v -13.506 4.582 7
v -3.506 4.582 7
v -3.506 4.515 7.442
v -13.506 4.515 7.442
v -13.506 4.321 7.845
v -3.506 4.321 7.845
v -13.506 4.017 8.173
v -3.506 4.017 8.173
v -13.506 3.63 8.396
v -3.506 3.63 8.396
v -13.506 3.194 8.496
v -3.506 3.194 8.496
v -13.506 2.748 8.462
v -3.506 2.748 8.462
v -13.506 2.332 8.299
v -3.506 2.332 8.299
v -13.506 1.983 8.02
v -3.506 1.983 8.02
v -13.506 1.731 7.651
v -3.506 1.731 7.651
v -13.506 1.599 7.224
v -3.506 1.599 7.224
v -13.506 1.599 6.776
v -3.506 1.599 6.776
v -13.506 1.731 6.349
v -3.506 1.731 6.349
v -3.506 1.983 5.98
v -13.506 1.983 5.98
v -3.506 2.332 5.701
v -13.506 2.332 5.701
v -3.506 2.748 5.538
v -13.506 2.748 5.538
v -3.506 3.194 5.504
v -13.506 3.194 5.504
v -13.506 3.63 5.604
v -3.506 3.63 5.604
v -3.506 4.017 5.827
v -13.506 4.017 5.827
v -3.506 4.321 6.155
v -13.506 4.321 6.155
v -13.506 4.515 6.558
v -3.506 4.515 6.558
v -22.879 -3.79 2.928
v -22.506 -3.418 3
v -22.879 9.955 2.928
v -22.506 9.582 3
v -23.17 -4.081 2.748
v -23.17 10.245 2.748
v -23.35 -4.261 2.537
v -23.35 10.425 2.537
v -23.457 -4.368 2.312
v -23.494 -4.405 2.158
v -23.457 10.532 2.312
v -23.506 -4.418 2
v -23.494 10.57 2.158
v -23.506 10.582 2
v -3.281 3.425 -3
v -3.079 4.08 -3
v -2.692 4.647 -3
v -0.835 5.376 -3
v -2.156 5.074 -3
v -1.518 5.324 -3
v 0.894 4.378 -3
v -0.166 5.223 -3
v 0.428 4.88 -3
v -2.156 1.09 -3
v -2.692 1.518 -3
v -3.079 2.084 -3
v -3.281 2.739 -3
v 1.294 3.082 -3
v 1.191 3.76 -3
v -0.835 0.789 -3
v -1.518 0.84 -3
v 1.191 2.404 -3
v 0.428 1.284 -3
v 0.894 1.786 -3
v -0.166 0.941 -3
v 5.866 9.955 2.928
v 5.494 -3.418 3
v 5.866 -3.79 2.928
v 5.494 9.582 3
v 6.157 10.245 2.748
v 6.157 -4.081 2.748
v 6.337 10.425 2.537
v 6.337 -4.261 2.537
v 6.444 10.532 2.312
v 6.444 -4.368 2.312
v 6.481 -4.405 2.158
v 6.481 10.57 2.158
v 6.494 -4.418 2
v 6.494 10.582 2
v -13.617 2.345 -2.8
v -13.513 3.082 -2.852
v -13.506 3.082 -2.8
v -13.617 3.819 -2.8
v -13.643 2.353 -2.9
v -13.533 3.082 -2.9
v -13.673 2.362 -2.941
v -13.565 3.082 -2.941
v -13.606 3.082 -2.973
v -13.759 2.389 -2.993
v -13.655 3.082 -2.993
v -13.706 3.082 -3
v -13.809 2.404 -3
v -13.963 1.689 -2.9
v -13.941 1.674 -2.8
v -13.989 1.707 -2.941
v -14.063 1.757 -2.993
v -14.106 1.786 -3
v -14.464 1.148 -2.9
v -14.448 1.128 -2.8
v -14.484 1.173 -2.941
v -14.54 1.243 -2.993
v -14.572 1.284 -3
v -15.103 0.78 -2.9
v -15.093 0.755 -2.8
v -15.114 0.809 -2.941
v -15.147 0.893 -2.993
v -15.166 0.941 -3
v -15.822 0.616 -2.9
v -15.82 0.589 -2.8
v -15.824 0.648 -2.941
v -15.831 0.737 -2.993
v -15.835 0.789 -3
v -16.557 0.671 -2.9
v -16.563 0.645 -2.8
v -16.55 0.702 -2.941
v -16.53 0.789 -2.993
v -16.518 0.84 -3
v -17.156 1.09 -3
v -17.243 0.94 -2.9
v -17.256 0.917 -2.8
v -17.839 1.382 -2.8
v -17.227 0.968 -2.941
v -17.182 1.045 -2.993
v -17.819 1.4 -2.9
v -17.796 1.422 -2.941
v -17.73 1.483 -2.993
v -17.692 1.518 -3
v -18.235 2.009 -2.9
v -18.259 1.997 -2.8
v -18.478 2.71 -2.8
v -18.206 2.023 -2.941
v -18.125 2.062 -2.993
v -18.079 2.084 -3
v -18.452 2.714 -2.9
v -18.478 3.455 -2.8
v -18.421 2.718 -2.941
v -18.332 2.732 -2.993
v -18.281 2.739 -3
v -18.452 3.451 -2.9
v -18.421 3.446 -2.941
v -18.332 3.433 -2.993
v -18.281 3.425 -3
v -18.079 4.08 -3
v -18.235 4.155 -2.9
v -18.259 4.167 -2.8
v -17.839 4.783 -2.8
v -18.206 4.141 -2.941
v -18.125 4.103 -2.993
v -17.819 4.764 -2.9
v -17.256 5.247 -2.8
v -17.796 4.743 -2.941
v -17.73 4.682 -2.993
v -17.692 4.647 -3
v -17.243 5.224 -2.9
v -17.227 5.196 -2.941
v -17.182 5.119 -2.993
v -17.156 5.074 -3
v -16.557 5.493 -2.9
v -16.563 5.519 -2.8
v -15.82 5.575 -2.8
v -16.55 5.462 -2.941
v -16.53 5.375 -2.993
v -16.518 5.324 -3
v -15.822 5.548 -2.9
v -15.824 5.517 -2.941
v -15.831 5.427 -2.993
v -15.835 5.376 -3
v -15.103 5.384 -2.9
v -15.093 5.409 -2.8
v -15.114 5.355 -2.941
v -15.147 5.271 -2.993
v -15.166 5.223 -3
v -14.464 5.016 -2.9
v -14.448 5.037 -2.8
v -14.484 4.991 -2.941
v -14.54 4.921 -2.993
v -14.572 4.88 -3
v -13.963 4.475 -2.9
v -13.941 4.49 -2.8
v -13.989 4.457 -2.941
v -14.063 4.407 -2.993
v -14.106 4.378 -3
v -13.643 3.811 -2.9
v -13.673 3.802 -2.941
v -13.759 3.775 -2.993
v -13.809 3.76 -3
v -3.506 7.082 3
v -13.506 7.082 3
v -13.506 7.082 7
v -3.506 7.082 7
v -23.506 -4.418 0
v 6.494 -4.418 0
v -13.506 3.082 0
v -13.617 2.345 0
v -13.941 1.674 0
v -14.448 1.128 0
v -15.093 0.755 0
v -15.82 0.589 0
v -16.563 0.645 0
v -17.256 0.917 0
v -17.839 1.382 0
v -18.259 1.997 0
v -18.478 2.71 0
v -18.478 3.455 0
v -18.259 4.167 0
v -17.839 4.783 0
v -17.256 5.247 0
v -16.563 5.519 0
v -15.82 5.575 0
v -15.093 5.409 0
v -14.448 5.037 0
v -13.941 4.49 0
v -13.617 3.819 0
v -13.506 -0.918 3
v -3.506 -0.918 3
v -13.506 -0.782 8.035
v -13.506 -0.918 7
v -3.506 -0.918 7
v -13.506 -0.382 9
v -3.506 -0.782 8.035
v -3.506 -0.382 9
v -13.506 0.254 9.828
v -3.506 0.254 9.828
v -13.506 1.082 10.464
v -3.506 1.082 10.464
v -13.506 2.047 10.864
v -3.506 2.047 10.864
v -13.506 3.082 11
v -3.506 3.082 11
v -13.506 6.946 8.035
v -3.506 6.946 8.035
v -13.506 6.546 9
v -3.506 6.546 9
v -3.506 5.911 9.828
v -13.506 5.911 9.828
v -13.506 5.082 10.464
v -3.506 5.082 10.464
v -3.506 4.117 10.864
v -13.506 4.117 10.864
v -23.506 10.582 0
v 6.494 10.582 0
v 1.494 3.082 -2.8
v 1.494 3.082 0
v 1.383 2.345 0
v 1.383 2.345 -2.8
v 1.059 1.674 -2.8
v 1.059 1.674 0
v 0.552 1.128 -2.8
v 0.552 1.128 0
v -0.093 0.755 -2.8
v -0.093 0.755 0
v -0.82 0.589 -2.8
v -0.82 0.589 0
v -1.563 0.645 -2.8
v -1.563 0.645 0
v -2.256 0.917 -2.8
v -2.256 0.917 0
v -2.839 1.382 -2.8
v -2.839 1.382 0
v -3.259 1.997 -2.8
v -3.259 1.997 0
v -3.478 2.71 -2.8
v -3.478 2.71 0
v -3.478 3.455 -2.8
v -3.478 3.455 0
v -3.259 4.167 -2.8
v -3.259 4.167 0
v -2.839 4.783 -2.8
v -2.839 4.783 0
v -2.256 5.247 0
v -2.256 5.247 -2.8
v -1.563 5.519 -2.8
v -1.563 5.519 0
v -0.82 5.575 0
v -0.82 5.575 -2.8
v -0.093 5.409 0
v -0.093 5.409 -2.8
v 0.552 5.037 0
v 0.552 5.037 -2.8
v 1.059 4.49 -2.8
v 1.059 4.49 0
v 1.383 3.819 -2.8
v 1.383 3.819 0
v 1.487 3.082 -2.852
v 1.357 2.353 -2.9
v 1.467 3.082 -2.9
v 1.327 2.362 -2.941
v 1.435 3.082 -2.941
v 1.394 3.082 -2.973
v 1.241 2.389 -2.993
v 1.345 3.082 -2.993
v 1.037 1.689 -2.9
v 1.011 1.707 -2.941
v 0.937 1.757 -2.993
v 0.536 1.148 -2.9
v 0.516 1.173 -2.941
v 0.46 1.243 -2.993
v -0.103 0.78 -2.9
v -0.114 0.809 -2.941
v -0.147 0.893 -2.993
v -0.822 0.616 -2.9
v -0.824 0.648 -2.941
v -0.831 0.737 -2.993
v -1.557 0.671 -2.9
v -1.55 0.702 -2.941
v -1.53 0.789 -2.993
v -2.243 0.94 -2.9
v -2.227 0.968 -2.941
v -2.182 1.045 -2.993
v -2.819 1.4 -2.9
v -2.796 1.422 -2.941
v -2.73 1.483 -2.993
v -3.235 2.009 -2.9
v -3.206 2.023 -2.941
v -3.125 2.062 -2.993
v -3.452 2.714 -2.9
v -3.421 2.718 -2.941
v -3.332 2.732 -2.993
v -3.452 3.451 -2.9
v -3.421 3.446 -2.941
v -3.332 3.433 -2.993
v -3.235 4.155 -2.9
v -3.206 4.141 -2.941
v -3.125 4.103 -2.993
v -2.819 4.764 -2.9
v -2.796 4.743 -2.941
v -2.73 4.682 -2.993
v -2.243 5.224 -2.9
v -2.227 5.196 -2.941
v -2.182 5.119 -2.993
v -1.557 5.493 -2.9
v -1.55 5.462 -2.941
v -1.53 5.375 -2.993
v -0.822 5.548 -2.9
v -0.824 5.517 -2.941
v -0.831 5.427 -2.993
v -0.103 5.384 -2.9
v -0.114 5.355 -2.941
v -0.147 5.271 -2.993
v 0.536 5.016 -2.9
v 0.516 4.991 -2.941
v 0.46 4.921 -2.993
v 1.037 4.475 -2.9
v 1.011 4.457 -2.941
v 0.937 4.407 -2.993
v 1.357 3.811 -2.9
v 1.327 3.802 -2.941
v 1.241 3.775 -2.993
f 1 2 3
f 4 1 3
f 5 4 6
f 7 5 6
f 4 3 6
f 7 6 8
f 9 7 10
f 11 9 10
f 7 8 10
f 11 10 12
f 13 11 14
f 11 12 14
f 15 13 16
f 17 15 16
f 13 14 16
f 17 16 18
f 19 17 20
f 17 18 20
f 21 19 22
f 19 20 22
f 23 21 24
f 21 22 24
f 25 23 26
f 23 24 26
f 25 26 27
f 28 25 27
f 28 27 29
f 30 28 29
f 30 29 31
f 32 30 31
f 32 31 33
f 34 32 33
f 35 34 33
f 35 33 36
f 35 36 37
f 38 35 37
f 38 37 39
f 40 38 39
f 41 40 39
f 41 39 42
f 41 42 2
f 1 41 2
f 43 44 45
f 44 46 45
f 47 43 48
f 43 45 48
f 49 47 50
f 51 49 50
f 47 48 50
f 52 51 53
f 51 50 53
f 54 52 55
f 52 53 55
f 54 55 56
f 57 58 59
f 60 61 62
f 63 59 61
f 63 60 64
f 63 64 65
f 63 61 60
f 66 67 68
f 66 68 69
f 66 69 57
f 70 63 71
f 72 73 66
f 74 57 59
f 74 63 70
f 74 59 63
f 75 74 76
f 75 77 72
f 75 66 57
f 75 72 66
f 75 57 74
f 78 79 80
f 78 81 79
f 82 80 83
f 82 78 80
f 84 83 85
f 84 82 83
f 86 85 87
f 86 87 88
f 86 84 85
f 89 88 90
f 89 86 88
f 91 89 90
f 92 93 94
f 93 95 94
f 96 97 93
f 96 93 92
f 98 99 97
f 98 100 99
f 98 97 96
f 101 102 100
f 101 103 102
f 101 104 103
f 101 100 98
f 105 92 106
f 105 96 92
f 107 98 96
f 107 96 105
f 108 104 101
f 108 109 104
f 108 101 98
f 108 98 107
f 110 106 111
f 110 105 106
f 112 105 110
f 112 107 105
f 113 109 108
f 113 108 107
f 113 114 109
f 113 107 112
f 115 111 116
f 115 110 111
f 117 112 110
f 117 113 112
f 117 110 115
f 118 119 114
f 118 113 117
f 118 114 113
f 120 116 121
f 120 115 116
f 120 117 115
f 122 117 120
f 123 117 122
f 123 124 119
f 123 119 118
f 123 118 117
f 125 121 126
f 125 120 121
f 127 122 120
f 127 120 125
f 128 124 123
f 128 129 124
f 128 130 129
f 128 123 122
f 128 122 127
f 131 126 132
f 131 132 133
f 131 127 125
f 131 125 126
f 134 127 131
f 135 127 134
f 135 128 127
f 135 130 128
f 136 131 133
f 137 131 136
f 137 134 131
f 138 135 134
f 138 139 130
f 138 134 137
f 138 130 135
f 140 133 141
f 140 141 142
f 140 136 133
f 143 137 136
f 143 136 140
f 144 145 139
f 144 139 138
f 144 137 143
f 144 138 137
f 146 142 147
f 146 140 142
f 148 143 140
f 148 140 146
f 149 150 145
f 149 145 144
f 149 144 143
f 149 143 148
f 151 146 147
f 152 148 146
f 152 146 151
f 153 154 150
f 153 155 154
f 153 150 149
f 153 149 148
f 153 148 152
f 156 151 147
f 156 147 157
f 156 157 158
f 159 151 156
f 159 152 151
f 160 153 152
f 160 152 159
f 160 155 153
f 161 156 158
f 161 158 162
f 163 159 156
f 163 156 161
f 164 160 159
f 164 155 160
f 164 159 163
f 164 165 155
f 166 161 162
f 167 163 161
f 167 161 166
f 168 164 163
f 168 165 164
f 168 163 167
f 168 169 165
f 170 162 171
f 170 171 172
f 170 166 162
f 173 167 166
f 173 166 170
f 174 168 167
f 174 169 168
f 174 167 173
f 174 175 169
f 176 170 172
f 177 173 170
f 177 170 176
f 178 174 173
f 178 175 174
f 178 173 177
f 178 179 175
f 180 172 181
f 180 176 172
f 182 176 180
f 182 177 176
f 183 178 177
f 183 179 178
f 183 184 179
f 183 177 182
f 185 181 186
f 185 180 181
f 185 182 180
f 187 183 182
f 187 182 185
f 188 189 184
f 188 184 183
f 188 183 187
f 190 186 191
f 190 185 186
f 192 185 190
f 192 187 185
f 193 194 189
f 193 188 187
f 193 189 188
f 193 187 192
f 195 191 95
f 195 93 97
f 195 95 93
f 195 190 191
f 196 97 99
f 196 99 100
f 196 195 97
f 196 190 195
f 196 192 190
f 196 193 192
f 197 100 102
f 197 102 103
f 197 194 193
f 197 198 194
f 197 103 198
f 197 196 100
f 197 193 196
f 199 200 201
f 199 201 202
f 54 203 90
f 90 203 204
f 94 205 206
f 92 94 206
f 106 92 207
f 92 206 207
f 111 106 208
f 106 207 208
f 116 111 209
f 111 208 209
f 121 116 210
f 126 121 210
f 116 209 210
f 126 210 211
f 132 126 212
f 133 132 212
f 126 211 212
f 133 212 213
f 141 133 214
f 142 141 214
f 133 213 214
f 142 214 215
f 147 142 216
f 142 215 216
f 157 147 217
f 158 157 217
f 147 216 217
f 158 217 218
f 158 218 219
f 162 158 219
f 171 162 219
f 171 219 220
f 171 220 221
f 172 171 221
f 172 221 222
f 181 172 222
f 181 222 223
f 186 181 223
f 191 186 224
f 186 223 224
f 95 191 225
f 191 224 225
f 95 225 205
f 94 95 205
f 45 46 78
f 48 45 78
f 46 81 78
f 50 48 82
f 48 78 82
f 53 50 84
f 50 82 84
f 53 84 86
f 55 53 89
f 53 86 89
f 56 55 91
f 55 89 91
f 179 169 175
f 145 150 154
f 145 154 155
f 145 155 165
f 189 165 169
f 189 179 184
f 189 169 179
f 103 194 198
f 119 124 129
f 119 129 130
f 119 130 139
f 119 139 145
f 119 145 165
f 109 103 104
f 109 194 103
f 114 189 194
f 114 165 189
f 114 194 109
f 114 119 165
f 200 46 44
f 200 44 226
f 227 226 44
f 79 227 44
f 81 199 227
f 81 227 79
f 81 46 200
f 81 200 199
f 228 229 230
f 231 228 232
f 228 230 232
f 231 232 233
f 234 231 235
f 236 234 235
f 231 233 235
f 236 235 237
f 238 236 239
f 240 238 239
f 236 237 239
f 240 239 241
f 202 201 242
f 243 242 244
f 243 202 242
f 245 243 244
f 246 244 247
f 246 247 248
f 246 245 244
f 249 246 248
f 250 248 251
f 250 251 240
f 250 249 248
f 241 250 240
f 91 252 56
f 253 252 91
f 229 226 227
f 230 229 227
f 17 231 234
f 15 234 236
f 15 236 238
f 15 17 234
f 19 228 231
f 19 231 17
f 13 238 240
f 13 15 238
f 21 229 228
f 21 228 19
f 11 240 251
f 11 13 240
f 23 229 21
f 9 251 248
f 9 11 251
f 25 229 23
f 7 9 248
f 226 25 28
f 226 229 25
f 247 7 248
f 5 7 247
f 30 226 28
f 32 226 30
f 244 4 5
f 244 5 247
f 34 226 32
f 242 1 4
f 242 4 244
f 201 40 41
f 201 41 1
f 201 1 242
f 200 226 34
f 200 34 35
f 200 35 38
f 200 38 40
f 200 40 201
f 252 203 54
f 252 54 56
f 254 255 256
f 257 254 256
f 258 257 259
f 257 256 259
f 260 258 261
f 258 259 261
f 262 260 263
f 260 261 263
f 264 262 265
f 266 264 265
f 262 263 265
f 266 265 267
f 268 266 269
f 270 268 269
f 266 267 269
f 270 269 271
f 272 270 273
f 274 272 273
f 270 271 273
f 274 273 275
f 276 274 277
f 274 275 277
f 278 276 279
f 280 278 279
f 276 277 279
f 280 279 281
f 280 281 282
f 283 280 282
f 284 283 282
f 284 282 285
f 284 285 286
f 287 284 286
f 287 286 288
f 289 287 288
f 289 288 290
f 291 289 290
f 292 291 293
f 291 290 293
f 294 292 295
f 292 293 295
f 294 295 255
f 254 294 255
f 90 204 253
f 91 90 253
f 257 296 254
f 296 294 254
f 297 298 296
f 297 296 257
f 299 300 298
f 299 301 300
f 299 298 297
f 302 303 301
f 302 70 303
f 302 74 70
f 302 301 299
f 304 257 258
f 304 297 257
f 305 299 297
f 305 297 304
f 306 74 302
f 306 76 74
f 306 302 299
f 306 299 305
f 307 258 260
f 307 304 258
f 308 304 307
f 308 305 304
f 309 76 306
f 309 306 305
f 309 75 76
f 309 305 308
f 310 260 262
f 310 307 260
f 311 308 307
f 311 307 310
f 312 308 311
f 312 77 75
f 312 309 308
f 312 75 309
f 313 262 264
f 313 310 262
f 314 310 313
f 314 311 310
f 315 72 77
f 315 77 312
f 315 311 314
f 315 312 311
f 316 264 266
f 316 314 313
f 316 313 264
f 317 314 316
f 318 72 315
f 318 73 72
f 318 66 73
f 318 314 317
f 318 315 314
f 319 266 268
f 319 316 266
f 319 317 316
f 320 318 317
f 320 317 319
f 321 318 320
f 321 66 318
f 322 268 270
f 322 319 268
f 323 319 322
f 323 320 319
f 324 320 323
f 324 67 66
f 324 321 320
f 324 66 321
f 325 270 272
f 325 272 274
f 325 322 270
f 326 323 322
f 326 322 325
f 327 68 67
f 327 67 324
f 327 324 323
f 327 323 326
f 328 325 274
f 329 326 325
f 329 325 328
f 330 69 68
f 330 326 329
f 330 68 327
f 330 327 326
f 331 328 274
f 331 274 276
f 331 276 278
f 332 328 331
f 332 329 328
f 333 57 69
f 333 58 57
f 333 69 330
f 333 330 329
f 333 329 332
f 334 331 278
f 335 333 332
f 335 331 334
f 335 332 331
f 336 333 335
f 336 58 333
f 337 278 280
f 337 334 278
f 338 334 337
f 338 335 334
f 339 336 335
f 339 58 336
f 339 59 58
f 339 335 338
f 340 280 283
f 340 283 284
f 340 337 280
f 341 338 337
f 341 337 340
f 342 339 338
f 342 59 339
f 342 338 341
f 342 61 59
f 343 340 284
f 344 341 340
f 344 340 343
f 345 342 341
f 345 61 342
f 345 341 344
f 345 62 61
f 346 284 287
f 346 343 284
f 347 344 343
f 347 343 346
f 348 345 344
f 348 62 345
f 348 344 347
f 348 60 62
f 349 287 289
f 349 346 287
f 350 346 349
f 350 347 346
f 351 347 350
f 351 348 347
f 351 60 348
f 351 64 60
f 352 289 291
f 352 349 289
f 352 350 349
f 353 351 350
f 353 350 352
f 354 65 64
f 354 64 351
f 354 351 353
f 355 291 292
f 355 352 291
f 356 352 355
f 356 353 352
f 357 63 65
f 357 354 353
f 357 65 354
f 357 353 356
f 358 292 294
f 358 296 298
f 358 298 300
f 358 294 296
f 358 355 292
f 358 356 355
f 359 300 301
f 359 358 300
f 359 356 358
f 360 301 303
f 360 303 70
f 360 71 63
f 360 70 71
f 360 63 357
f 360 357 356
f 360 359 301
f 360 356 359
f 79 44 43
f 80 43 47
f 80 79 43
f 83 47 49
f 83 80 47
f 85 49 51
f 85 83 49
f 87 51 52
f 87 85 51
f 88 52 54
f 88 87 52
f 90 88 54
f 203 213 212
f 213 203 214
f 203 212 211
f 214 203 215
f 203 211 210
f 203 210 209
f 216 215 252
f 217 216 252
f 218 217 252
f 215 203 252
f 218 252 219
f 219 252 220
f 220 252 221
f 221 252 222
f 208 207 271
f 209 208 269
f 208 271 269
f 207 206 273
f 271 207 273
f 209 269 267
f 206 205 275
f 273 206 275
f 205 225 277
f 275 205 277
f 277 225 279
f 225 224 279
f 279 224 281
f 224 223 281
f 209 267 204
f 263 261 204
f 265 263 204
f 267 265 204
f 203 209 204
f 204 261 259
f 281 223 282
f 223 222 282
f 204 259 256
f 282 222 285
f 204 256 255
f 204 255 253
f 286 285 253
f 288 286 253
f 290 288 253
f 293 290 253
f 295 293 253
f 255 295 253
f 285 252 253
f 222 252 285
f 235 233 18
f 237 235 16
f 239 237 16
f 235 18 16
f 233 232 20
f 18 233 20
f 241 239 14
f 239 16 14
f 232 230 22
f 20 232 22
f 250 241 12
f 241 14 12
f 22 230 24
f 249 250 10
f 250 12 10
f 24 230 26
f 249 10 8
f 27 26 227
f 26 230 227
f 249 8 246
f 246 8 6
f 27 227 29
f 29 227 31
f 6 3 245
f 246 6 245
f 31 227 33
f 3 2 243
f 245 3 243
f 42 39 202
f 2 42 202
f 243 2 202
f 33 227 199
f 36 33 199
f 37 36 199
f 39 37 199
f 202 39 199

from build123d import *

# Parameters (mm, degrees)
F0_W     = 30
F0_H     = 15
F1_DEPTH = 3
F2_W     = 10
F2_H     = 8
F3_DEPTH = 8
F4_R     = 3.99999
F5_R     = 1.5
F6_DEPTH = 25
F7_R     = 1
F8_R     = 2.5
F9_DEPTH = 3
F10_R    = 0.2


# Not quite as in the source:
# - a fillet or chamfer is up to 0.001 mm smaller than in the source, because OpenCascade refuses the exact size


with BuildPart() as f1:
    # F0 (on Top) → F1 (new body)
    with BuildSketch(Plane.XY):
        with Locations((-8.5063918959, 3.0821188468)):
            Rectangle(F0_W, F0_H)
    extrude(amount=F1_DEPTH)

    # F2 (on face) → F3 (join)
    with BuildSketch(Plane.XY.offset(3)):
        with Locations((-8.5063918959, 3.0821188468)):
            Rectangle(F2_W, F2_H)
    extrude(amount=F3_DEPTH)

    # F4 (radius 4 in the source; OpenCascade refuses exactly that, so slightly less here)
    f4_edges = [f1.edges().sort_by_distance(p)[0] for p in [
        (-8.506392, -0.917881, 11),
        (-8.506392, 7.082119, 11),
    ]]
    fillet(f4_edges, radius=F4_R)

    # F5 (on face) → F6 (cut)
    with BuildSketch(Plane.YZ.offset(-3.5063918959)):
        with Locations((3.0821188468, 7)):
            Circle(F5_R)
    extrude(amount=-F6_DEPTH, mode=Mode.SUBTRACT)

    # F7
    f7_edges = [f1.edges().sort_by_distance(p)[0] for p in [
        (-23.506392, 3.082119, 3),
        (-8.506392, 10.582119, 3),
        (6.493608, 3.082119, 3),
        (-8.506392, -4.417881, 3),
    ]]
    fillet(f7_edges, radius=F7_R)

    # F8 (on face) → F9 (join)
    with BuildSketch(Plane(origin=(0, 0, 0), x_dir=(1, 0, 0), z_dir=(0, 0, -1))):
        with Locations((-16.0063918959, -3.0821188468)):
            Circle(F8_R)
        with Locations((-1.0063918959, -3.0821188468)):
            Circle(F8_R)
    extrude(amount=F9_DEPTH)

    # F10
    f10_edges = [f1.edges().sort_by_distance(p)[0] for p in [
        (-18.506392, 3.082119, -3),
        (-3.506392, 3.082119, -3),
    ]]
    fillet(f10_edges, radius=F10_R)


solid = f1.part
